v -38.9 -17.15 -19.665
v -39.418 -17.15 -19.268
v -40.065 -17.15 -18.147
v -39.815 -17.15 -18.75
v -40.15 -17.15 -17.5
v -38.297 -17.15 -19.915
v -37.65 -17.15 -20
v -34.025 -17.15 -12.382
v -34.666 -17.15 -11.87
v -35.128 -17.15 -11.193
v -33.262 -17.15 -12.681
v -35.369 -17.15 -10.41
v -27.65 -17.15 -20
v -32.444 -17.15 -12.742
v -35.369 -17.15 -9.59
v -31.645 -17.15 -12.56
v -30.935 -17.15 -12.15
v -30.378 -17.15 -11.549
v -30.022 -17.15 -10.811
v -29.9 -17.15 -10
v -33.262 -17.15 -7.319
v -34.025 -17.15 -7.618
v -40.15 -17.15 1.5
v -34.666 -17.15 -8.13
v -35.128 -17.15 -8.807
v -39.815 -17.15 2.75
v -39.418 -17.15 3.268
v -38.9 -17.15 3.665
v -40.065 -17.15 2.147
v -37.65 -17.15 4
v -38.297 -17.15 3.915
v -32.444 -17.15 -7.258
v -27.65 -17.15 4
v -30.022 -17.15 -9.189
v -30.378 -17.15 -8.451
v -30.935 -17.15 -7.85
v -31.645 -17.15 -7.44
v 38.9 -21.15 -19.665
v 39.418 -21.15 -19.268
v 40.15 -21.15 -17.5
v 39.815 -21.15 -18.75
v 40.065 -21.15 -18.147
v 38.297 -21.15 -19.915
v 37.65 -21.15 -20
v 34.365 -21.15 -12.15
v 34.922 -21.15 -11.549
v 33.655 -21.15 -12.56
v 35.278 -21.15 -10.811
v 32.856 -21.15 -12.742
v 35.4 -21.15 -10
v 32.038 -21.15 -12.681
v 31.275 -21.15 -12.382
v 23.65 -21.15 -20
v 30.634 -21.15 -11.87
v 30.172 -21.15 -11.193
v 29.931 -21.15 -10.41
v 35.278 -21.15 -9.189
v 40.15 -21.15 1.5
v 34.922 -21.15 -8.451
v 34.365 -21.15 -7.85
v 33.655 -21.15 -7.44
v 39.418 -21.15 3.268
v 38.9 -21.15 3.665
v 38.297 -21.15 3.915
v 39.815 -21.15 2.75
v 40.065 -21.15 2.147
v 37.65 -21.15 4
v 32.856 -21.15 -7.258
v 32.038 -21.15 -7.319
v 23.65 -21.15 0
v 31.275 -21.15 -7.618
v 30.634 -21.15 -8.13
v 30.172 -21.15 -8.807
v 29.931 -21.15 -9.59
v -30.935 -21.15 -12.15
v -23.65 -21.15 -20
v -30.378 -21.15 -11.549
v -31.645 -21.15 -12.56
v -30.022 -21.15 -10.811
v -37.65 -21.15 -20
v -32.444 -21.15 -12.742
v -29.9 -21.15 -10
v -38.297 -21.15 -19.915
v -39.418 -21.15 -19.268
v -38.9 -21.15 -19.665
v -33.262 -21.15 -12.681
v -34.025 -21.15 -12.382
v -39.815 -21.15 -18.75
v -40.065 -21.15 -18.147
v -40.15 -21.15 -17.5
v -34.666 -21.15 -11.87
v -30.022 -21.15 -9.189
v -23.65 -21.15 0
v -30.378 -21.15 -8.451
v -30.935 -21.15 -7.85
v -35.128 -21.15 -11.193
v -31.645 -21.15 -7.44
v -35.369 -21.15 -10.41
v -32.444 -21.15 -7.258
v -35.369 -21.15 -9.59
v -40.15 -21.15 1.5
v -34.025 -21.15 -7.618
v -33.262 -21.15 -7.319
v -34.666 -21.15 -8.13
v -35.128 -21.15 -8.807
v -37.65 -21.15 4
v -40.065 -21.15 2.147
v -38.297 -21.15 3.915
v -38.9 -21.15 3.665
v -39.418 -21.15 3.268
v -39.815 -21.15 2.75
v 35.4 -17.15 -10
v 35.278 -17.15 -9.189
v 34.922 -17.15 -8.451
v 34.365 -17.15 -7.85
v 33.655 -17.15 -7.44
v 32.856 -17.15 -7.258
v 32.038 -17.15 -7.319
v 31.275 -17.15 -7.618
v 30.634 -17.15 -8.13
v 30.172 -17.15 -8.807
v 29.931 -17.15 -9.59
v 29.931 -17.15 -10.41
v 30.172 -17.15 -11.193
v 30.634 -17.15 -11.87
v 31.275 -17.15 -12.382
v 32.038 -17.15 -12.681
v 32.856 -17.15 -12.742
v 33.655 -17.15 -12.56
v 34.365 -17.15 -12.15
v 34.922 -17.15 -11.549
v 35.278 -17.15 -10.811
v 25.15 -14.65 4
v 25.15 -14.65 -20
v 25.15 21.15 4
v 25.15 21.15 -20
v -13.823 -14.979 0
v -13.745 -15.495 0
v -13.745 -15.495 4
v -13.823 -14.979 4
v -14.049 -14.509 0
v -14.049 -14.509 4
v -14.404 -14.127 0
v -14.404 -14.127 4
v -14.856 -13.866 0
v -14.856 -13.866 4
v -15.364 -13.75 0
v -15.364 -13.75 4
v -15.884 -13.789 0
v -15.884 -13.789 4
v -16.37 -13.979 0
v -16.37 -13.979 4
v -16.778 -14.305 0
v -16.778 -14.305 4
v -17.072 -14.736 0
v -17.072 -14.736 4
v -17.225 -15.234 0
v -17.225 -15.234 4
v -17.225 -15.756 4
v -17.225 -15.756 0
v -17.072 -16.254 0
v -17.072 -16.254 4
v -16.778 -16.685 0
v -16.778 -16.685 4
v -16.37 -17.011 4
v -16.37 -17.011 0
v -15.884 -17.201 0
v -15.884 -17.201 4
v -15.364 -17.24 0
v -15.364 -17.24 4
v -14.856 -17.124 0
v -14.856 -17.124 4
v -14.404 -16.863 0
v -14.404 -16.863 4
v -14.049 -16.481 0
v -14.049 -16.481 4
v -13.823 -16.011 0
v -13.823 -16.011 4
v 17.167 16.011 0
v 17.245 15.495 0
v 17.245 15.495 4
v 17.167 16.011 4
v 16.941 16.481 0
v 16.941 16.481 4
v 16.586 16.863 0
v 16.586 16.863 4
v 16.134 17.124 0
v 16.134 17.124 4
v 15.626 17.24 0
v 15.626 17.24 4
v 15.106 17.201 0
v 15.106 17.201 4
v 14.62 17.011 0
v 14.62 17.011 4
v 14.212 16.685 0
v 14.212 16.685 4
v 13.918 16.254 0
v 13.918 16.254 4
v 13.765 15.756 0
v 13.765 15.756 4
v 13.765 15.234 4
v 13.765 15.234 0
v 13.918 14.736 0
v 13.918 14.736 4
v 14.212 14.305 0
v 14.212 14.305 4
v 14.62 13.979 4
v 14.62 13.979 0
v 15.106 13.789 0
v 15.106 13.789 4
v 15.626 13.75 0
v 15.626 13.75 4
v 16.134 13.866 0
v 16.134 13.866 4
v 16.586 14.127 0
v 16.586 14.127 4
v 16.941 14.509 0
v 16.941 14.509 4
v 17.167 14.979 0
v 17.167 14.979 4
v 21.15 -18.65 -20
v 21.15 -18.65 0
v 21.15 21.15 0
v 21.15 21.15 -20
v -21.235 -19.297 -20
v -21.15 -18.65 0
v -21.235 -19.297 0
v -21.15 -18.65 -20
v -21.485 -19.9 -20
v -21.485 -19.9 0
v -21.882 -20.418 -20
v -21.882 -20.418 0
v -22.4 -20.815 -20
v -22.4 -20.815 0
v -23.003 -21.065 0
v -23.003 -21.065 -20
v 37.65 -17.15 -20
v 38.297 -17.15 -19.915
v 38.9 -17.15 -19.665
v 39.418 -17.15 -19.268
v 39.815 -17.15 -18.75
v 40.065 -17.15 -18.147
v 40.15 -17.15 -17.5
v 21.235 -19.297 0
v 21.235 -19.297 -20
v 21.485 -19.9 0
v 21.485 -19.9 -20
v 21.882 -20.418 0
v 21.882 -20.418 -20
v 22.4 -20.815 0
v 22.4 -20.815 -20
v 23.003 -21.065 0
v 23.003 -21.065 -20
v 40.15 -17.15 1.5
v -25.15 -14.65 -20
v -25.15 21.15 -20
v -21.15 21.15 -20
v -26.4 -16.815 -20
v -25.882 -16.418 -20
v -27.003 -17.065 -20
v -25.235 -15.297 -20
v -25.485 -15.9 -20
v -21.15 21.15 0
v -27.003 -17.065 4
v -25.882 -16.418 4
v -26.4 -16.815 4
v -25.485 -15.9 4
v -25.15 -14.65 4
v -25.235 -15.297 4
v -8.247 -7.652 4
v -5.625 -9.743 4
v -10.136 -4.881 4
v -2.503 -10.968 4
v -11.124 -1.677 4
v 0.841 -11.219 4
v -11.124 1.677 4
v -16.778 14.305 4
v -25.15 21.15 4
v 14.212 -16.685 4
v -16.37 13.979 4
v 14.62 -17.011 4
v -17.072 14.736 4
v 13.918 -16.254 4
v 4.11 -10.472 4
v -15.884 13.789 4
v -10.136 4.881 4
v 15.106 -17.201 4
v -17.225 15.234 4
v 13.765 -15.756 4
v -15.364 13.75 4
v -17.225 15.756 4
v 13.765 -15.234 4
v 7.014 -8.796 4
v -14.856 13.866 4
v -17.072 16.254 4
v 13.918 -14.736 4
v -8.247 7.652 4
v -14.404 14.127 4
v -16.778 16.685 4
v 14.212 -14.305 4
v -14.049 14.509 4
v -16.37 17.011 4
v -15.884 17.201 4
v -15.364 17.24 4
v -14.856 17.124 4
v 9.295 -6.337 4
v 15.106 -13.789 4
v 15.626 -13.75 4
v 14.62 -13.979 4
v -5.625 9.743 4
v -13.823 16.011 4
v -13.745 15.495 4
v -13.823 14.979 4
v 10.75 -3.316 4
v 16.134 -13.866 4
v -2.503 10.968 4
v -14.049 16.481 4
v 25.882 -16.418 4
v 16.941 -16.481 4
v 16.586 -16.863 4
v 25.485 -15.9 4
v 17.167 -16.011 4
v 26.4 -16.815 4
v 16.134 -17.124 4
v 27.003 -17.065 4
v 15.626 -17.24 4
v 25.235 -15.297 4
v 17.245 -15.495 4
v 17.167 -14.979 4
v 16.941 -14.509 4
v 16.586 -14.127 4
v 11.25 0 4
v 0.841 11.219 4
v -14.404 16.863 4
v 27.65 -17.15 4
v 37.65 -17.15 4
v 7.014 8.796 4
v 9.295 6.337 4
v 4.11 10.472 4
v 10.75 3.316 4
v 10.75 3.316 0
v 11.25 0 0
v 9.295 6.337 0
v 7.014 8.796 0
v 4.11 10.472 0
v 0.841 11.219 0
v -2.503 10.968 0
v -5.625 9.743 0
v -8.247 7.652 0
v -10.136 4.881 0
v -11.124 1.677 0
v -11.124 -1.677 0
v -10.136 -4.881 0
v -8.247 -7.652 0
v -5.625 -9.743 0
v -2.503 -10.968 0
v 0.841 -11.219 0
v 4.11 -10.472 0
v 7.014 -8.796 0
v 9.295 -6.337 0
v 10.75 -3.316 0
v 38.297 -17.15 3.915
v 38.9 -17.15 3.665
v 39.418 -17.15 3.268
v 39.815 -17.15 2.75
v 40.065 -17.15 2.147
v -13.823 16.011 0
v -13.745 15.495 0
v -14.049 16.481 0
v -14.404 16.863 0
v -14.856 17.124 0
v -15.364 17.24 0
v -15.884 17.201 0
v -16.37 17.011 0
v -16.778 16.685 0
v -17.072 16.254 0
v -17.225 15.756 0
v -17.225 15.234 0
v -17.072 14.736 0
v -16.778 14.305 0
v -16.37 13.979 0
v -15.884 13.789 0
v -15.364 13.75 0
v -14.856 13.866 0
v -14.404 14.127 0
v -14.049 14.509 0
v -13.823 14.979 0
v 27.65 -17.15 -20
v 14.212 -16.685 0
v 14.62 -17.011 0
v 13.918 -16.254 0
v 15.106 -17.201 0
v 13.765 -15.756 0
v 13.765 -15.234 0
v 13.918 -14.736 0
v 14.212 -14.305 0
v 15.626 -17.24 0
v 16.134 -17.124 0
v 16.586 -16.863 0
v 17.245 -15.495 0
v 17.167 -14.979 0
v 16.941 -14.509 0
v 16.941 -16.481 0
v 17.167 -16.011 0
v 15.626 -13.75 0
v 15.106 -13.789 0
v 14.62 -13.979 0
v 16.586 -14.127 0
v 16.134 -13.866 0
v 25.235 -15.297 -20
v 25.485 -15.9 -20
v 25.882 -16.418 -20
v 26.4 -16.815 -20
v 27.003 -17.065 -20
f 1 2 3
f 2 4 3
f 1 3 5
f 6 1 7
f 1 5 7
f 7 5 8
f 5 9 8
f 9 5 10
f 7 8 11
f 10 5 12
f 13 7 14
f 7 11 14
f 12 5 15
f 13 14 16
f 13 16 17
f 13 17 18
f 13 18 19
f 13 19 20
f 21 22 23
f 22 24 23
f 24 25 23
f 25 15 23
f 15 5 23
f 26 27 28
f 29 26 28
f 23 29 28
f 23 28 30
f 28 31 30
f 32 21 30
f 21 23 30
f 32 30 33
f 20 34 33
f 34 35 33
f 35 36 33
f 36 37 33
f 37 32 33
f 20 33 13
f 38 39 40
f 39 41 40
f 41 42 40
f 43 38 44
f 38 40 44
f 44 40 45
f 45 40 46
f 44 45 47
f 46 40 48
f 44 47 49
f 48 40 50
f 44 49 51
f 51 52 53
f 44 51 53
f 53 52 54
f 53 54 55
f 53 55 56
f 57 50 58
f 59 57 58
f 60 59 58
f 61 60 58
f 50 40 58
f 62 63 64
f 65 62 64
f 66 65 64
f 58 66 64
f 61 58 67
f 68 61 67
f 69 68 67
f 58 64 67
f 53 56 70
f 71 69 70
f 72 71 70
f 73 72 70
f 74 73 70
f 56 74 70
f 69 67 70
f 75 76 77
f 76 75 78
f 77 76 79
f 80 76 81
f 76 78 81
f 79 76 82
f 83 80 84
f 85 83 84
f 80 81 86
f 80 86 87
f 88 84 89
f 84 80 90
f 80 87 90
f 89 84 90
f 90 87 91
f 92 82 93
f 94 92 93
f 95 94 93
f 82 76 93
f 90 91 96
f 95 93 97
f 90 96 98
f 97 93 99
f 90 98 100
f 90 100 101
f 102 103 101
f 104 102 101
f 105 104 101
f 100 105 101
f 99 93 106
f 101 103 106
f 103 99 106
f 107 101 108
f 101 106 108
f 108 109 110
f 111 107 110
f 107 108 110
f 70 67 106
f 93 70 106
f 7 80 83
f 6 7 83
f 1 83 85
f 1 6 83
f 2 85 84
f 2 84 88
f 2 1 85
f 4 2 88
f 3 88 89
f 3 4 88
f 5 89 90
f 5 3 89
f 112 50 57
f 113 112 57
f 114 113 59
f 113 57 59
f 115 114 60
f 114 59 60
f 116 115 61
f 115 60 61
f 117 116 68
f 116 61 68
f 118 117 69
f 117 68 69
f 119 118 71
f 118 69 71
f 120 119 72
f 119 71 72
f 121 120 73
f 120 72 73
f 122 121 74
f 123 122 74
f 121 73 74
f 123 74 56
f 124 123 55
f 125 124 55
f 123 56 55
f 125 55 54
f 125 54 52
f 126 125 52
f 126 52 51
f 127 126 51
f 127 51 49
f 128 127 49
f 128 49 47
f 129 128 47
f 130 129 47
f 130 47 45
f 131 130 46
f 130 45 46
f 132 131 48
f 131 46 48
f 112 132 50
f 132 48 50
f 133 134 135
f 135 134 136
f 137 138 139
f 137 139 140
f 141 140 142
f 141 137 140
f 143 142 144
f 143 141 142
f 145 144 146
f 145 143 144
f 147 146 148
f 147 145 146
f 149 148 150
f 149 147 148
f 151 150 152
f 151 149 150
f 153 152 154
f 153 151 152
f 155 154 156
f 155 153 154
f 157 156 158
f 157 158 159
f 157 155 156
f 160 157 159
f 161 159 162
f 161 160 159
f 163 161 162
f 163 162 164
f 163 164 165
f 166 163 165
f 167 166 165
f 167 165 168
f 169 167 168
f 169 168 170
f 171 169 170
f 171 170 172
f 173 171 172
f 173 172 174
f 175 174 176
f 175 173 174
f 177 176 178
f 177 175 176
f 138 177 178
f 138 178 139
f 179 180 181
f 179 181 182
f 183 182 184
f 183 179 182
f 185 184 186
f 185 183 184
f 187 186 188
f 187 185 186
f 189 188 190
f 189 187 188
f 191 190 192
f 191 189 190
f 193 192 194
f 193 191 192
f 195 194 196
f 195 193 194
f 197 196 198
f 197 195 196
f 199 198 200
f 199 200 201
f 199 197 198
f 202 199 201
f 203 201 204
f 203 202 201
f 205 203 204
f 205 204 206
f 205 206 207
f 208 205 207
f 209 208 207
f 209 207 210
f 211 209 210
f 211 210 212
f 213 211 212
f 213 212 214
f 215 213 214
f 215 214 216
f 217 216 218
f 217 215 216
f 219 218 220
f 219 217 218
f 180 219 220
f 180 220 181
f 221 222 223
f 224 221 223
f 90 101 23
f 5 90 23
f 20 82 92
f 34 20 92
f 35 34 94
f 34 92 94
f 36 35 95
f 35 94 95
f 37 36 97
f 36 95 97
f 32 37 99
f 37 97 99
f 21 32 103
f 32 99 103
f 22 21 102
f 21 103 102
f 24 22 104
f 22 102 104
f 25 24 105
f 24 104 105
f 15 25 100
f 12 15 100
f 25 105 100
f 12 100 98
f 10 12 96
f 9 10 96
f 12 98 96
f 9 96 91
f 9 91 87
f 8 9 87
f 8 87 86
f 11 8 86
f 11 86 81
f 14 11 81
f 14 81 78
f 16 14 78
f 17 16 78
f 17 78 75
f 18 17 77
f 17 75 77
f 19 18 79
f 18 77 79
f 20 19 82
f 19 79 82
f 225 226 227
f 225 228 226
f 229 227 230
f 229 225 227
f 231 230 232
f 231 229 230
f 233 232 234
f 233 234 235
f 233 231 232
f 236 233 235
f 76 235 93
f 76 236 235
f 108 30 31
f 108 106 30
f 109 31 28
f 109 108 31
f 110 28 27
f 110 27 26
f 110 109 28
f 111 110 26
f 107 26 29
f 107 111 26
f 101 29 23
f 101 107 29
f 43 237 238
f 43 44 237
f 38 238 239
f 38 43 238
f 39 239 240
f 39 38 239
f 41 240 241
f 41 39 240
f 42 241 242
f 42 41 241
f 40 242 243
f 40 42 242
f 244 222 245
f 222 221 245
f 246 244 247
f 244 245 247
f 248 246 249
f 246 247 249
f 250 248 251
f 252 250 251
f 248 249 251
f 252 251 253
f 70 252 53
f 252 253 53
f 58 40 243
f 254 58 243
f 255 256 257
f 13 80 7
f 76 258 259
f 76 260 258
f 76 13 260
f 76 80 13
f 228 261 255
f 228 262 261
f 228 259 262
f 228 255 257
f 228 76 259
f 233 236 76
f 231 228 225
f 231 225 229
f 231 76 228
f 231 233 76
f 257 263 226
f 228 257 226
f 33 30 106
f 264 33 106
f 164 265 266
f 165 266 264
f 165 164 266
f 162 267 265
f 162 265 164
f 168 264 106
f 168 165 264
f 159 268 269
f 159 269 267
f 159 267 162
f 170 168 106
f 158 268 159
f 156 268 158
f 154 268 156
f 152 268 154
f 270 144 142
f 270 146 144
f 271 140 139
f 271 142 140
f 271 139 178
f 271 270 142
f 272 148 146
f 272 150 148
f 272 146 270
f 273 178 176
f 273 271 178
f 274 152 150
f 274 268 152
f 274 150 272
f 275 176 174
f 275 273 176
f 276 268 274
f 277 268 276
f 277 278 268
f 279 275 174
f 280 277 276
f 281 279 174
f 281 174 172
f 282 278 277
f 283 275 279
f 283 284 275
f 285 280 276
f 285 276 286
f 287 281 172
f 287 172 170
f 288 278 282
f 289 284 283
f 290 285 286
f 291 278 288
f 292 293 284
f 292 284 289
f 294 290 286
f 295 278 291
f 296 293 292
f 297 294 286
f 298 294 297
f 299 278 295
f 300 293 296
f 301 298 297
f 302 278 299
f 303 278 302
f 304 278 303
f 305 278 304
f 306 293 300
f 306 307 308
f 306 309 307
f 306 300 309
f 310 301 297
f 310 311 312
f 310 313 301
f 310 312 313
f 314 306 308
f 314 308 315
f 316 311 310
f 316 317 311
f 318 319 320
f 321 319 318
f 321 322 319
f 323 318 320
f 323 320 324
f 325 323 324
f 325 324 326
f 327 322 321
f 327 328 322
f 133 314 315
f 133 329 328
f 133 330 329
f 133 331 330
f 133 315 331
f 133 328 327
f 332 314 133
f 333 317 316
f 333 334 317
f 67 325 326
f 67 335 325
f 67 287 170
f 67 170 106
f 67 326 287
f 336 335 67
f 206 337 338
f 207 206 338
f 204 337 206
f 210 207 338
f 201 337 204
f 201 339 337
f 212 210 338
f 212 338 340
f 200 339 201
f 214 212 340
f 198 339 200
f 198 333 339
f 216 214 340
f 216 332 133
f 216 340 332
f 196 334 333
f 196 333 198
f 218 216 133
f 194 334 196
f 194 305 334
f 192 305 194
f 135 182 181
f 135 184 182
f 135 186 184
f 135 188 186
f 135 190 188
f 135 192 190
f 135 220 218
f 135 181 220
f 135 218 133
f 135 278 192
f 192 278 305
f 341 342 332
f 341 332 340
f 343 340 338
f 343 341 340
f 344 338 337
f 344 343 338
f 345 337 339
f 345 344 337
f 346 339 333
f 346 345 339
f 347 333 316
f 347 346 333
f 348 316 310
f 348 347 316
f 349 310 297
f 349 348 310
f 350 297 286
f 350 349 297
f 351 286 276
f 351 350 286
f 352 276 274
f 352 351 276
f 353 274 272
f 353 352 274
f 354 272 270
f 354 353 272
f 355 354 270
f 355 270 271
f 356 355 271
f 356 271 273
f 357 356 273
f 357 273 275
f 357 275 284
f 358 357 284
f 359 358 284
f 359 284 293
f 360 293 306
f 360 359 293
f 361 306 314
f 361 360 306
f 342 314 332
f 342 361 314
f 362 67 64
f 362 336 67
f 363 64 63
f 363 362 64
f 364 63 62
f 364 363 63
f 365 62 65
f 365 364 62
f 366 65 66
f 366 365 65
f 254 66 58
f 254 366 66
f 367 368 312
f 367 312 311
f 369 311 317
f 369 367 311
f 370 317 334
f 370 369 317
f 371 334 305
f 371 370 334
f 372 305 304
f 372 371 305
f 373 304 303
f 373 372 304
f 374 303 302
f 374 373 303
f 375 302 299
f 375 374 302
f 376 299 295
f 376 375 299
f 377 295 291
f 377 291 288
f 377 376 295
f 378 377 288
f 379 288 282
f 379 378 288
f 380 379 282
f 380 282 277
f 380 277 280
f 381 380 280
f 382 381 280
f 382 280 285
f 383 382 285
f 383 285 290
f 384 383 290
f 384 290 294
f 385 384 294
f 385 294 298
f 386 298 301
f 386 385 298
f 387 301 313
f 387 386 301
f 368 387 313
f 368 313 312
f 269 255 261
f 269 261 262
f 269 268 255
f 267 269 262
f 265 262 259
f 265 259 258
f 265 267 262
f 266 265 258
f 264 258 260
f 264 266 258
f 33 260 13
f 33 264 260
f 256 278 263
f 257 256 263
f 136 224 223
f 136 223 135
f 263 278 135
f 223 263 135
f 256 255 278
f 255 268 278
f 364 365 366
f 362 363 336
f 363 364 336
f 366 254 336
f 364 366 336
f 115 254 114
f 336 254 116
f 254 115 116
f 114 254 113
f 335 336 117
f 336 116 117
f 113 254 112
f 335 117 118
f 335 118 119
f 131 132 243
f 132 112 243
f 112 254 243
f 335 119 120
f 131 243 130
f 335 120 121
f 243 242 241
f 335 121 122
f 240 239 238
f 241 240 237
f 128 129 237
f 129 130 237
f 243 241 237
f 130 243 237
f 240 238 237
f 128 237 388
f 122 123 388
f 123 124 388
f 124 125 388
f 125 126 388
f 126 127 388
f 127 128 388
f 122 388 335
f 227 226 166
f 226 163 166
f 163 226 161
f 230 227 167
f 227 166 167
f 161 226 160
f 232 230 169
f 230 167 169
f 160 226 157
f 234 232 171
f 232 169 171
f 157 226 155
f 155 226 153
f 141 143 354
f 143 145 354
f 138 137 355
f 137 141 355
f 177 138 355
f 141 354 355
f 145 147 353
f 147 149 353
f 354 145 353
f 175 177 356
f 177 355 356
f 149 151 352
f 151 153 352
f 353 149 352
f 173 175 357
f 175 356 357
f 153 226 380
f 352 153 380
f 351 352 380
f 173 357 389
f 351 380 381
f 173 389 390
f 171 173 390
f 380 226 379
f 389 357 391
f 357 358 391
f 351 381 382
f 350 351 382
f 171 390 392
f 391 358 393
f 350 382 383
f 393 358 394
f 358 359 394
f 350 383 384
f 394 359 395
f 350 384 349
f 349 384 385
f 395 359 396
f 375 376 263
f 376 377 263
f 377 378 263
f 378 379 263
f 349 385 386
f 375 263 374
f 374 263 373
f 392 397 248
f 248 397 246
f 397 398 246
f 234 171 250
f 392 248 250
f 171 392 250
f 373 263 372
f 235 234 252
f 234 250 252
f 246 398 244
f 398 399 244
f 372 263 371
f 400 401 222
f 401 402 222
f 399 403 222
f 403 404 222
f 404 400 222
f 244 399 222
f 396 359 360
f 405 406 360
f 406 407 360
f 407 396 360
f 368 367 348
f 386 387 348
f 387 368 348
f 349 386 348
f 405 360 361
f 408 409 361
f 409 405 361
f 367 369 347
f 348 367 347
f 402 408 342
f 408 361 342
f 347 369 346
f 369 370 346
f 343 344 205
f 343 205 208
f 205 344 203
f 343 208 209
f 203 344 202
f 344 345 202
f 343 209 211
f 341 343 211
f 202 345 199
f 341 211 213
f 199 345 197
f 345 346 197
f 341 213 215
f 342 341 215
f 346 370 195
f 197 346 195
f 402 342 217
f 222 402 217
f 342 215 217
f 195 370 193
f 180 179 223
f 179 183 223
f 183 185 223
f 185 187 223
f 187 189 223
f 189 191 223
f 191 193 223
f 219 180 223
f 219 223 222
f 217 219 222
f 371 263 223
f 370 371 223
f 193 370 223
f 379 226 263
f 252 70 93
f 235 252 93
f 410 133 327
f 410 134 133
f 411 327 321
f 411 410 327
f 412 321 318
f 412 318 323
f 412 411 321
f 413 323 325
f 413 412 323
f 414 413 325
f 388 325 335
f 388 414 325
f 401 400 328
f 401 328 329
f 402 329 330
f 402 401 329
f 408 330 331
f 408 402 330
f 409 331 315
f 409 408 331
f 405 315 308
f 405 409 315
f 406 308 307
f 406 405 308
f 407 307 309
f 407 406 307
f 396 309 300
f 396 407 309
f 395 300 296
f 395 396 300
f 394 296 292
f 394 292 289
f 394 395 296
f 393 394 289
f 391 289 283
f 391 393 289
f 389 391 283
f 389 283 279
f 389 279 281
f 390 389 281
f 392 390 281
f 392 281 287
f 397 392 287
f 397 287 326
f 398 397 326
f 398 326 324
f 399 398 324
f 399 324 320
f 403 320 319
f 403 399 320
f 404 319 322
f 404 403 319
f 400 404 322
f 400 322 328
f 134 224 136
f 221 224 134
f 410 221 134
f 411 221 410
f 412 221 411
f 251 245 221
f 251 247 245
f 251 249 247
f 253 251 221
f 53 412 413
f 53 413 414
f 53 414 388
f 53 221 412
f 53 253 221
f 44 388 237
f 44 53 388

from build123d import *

# Parameters (mm, degrees)
F0_W     = 4
F0_H     = 38.3
F0_R     = 1.75
F0_R_2   = 11.25
F1_DEPTH = 4
F3_DEPTH = 20
F4_R     = 2.75
F5_DEPTH = 4
F6_R     = 2.5


with BuildPart() as f1:
    # F0 (on Top) → F1 (new body)
    with BuildSketch(Plane.XY):
        with Locations((-23.15, 2)):
            Rectangle(F0_W, F0_H)
        Polygon((21.15, 21.15), (-21.15, 21.15), (-21.15, -17.15), (-21.15, -21.15), (21.15, -21.15), (21.15, -17.15), align=None)
        with Locations((-15.495, -15.495)):
            Circle(F0_R, mode=Mode.SUBTRACT)
        with Locations((15.495, -15.495)):
            Circle(F0_R, mode=Mode.SUBTRACT)
        with Locations((-15.495, 15.495)):
            Circle(F0_R, mode=Mode.SUBTRACT)
        Circle(F0_R_2, mode=Mode.SUBTRACT)
        with Locations((15.495, 15.495)):
            Circle(F0_R, mode=Mode.SUBTRACT)
        with Locations((23.15, 2)):
            Rectangle(F0_W, F0_H)
        Polygon((-21.15, -21.15), (-21.15, -17.15), (-25.15, -17.15), (-40.15, -17.15), (-40.15, -21.15), align=None)
        Polygon((25.15, -17.15), (21.15, -17.15), (21.15, -21.15), (40.15, -21.15), (40.15, -17.15), align=None)
    extrude(amount=F1_DEPTH)

    # F2 (on face) → F3 (join)
    with BuildSketch(Plane(origin=(0, 0, 0), x_dir=(1, 0, 0), z_dir=(0, 0, -1))):
        Polygon((-25.15, -21.15), (-21.15, -21.15), (-21.15, 17.15), (-21.15, 21.15), (-40.15, 21.15), (-40.15, 17.15), (-25.15, 17.15), align=None)
        Polygon((21.15, 17.15), (21.15, -21.15), (25.15, -21.15), (25.15, 17.15), (40.15, 17.15), (40.15, 21.15), (21.15, 21.15), align=None)
    extrude(amount=F3_DEPTH)

    # F4 (on face) → F5 (cut, through all)
    with BuildSketch(Plane.XZ.offset(21.15)):
        with Locations((-32.65, -10)):
            Circle(F4_R)
        with Locations((32.65, -10)):
            Circle(F4_R)
    extrude(amount=-F5_DEPTH, mode=Mode.SUBTRACT)

    # F6
    f6_edges = [f1.edges().sort_by_distance(p)[0] for p in [
        (-40.15, -19.15, 4),
        (-40.15, -19.15, -20),
        (40.15, -19.15, -20),
        (40.15, -19.15, 4),
        (25.15, -17.15, -8),
        (-25.15, -17.15, -8),
        (21.15, -21.15, -10),
        (-21.15, -21.15, -10),
    ]]
    fillet(f6_edges, radius=F6_R)


solid = f1.part
